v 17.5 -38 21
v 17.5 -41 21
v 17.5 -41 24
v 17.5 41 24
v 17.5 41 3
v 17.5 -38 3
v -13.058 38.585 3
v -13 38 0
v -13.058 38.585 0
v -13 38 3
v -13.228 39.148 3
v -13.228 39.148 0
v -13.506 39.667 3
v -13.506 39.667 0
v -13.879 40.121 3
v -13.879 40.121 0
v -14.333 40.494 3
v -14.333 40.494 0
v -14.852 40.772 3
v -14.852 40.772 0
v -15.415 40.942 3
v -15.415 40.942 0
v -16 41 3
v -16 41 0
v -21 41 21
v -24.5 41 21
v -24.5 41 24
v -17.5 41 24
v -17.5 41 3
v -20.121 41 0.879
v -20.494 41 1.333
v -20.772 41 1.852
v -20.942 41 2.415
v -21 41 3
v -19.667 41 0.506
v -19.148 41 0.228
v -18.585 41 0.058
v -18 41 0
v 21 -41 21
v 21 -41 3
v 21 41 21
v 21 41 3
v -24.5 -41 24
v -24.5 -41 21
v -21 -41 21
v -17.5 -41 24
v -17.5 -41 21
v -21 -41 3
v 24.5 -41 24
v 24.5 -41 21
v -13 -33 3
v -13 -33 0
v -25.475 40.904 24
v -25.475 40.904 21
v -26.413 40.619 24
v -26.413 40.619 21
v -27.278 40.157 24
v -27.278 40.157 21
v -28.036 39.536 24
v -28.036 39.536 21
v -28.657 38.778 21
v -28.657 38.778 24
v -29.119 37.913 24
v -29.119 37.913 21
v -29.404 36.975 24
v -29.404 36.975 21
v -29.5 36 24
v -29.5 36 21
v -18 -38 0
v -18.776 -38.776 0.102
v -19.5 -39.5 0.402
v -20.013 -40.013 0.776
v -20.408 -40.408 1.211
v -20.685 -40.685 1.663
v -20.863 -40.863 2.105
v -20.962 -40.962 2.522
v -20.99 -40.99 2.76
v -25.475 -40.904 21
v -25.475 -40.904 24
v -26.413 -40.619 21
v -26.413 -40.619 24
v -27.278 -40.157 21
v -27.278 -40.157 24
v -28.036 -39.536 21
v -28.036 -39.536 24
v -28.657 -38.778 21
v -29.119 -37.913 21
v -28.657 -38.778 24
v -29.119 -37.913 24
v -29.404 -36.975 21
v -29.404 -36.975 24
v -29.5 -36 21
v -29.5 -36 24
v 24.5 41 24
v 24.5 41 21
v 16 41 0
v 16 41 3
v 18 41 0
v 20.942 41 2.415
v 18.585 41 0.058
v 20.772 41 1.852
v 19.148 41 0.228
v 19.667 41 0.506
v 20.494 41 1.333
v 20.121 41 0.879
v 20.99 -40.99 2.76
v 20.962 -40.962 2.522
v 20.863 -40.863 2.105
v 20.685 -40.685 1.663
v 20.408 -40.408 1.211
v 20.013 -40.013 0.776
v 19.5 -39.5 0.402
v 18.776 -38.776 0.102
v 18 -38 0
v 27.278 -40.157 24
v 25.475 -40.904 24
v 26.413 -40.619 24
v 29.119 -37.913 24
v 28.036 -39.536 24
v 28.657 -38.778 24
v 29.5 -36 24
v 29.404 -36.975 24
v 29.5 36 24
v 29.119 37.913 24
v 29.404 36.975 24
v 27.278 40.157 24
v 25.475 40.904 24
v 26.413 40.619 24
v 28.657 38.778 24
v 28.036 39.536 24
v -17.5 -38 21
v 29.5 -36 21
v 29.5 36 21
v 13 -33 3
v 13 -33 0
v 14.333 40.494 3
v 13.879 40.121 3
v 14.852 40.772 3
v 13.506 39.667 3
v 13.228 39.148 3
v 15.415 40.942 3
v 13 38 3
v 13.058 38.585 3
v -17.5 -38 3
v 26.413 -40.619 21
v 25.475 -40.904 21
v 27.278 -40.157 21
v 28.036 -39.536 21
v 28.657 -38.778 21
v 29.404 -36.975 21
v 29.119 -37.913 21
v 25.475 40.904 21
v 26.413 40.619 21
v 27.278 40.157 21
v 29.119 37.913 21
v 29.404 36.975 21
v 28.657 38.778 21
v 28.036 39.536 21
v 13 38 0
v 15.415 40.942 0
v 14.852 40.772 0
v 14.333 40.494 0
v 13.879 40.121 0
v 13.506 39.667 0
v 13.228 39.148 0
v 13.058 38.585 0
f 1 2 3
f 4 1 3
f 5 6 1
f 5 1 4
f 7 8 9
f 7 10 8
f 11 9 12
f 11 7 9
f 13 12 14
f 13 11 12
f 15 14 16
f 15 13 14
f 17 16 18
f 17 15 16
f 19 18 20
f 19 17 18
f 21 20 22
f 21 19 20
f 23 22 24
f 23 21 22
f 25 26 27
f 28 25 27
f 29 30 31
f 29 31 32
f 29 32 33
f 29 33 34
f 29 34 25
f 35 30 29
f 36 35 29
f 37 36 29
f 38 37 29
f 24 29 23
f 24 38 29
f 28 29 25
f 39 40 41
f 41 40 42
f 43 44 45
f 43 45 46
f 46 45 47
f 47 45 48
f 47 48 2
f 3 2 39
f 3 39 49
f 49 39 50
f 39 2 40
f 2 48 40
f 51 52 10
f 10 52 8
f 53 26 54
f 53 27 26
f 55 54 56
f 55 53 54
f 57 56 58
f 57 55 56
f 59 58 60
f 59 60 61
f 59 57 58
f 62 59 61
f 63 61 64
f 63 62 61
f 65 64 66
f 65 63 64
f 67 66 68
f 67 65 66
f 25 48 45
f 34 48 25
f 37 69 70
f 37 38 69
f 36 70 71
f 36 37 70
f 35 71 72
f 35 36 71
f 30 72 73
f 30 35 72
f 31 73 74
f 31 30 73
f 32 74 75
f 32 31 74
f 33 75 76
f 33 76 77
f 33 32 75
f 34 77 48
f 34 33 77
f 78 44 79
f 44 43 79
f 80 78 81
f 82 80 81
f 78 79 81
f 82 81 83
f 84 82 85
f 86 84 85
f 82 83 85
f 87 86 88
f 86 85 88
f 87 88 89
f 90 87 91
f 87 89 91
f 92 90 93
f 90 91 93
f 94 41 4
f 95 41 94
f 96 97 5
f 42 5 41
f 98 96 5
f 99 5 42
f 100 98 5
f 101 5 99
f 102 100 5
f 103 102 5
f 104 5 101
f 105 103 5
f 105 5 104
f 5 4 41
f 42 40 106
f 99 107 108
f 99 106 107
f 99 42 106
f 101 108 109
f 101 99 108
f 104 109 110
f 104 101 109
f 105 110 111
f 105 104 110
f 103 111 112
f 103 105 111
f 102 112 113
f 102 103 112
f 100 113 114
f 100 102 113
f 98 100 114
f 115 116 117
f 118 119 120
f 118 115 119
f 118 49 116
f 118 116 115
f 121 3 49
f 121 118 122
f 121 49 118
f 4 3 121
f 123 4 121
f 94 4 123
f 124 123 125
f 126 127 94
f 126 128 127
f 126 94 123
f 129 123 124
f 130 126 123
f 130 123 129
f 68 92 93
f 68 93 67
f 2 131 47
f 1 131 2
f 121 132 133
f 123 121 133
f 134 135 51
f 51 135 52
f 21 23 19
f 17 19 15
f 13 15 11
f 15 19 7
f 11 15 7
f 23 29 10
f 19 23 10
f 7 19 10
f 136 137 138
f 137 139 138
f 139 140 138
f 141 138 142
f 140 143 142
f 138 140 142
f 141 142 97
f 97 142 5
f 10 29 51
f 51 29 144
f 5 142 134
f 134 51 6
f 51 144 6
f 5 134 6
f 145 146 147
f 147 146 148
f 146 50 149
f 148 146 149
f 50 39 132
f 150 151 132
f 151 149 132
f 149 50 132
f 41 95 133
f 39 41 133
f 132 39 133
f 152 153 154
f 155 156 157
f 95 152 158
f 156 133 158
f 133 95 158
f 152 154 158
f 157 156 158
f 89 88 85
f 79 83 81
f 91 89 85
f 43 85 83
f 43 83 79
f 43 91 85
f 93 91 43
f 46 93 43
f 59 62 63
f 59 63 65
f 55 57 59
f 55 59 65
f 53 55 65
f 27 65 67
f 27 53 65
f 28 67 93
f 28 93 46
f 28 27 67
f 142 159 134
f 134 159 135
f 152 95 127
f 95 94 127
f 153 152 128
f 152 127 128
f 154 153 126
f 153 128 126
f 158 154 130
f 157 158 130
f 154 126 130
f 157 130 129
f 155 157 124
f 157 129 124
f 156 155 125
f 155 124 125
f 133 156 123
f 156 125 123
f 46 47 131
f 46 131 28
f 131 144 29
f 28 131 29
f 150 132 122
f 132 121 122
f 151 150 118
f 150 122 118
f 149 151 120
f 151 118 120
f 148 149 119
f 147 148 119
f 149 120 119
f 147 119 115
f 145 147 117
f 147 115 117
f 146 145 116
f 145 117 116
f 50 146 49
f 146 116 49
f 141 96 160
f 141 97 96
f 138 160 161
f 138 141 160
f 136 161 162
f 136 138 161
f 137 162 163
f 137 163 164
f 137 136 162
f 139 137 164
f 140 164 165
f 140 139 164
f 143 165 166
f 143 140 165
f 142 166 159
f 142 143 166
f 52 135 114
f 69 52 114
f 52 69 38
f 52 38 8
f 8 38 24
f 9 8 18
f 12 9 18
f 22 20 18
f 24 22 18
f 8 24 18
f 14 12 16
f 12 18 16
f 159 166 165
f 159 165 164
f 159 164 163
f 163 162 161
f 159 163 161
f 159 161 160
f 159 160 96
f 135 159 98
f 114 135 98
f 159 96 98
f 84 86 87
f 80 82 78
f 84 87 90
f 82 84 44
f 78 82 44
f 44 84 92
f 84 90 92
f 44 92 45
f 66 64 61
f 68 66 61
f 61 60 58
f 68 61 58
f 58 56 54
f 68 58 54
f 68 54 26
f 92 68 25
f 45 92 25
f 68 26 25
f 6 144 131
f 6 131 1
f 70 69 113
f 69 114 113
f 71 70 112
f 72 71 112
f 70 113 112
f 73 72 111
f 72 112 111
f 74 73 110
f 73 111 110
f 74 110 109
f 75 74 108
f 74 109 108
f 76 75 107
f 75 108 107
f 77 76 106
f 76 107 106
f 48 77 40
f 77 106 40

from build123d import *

# Parameters (mm, degrees)
F0_W     = 42
F0_H     = 82
F1_DEPTH = 3
F2_W     = 42
F2_H     = 82
F2_W_2   = 35
F2_H_2   = 76
F3_DEPTH = 18
F4_W     = 12
F4_H     = 82
F5_DEPTH = 3
F7_DEPTH = 25
F8_DEPTH = 25
F9_R     = 3
F10_R    = 5


with BuildPart() as f1:
    # F0 (on Top) → F1 (new body)
    with BuildSketch(Plane.XY):
        Rectangle(F0_W, F0_H)
    extrude(amount=F1_DEPTH)

    # F2 (on face) → F3 (join)
    with BuildSketch(Plane.XY.offset(3)):
        Rectangle(F2_W, F2_H)
        Rectangle(F2_W_2, F2_H_2, mode=Mode.SUBTRACT)
    extrude(amount=F3_DEPTH)

    # F4 (on face) → F5 (join)
    with BuildSketch(Plane.XY.offset(21)):
        with Locations((-23.5, 0)):
            Rectangle(F4_W, F4_H)
        with Locations((23.5, 0)):
            Rectangle(F4_W, F4_H)
    extrude(amount=F5_DEPTH)

    # F6 (on face) → F7 (cut)
    with BuildSketch(Plane(origin=(0, 0, 0), x_dir=(1, 0, 0), z_dir=(0, 0, -1))):
        Polygon((13, 7.8317355365), (13, 33), (3.5048450809, 33), (-13, 33), (-13, 14.662142843), (-13, -41), (13, -41), align=None)
    extrude(amount=-F7_DEPTH, mode=Mode.SUBTRACT)

    # F8 (cut): faces of the model
    f8_faces = [f1.faces().sort_by_distance(p)[0] for p in [
        (15.25, 38, 12),
        (-15.25, 38, 12),
    ]]
    extrude(f8_faces, amount=-F8_DEPTH, mode=Mode.SUBTRACT)

    # F9
    f9_edges = [f1.edges().sort_by_distance(p)[0] for p in [
        (-21, 0, 0),
        (0, -41, 0),
        (21, 0, 0),
        (-13, 41, 1.5),
        (13, 41, 1.5),
    ]]
    fillet(f9_edges, radius=F9_R)

    # F10
    f10_edges = [f1.edges().sort_by_distance(p)[0] for p in [
        (29.5, -41, 22.5),
        (-29.5, -41, 22.5),
        (-29.5, 41, 22.5),
        (29.5, 41, 22.5),
    ]]
    fillet(f10_edges, radius=F10_R)


solid = f1.part
